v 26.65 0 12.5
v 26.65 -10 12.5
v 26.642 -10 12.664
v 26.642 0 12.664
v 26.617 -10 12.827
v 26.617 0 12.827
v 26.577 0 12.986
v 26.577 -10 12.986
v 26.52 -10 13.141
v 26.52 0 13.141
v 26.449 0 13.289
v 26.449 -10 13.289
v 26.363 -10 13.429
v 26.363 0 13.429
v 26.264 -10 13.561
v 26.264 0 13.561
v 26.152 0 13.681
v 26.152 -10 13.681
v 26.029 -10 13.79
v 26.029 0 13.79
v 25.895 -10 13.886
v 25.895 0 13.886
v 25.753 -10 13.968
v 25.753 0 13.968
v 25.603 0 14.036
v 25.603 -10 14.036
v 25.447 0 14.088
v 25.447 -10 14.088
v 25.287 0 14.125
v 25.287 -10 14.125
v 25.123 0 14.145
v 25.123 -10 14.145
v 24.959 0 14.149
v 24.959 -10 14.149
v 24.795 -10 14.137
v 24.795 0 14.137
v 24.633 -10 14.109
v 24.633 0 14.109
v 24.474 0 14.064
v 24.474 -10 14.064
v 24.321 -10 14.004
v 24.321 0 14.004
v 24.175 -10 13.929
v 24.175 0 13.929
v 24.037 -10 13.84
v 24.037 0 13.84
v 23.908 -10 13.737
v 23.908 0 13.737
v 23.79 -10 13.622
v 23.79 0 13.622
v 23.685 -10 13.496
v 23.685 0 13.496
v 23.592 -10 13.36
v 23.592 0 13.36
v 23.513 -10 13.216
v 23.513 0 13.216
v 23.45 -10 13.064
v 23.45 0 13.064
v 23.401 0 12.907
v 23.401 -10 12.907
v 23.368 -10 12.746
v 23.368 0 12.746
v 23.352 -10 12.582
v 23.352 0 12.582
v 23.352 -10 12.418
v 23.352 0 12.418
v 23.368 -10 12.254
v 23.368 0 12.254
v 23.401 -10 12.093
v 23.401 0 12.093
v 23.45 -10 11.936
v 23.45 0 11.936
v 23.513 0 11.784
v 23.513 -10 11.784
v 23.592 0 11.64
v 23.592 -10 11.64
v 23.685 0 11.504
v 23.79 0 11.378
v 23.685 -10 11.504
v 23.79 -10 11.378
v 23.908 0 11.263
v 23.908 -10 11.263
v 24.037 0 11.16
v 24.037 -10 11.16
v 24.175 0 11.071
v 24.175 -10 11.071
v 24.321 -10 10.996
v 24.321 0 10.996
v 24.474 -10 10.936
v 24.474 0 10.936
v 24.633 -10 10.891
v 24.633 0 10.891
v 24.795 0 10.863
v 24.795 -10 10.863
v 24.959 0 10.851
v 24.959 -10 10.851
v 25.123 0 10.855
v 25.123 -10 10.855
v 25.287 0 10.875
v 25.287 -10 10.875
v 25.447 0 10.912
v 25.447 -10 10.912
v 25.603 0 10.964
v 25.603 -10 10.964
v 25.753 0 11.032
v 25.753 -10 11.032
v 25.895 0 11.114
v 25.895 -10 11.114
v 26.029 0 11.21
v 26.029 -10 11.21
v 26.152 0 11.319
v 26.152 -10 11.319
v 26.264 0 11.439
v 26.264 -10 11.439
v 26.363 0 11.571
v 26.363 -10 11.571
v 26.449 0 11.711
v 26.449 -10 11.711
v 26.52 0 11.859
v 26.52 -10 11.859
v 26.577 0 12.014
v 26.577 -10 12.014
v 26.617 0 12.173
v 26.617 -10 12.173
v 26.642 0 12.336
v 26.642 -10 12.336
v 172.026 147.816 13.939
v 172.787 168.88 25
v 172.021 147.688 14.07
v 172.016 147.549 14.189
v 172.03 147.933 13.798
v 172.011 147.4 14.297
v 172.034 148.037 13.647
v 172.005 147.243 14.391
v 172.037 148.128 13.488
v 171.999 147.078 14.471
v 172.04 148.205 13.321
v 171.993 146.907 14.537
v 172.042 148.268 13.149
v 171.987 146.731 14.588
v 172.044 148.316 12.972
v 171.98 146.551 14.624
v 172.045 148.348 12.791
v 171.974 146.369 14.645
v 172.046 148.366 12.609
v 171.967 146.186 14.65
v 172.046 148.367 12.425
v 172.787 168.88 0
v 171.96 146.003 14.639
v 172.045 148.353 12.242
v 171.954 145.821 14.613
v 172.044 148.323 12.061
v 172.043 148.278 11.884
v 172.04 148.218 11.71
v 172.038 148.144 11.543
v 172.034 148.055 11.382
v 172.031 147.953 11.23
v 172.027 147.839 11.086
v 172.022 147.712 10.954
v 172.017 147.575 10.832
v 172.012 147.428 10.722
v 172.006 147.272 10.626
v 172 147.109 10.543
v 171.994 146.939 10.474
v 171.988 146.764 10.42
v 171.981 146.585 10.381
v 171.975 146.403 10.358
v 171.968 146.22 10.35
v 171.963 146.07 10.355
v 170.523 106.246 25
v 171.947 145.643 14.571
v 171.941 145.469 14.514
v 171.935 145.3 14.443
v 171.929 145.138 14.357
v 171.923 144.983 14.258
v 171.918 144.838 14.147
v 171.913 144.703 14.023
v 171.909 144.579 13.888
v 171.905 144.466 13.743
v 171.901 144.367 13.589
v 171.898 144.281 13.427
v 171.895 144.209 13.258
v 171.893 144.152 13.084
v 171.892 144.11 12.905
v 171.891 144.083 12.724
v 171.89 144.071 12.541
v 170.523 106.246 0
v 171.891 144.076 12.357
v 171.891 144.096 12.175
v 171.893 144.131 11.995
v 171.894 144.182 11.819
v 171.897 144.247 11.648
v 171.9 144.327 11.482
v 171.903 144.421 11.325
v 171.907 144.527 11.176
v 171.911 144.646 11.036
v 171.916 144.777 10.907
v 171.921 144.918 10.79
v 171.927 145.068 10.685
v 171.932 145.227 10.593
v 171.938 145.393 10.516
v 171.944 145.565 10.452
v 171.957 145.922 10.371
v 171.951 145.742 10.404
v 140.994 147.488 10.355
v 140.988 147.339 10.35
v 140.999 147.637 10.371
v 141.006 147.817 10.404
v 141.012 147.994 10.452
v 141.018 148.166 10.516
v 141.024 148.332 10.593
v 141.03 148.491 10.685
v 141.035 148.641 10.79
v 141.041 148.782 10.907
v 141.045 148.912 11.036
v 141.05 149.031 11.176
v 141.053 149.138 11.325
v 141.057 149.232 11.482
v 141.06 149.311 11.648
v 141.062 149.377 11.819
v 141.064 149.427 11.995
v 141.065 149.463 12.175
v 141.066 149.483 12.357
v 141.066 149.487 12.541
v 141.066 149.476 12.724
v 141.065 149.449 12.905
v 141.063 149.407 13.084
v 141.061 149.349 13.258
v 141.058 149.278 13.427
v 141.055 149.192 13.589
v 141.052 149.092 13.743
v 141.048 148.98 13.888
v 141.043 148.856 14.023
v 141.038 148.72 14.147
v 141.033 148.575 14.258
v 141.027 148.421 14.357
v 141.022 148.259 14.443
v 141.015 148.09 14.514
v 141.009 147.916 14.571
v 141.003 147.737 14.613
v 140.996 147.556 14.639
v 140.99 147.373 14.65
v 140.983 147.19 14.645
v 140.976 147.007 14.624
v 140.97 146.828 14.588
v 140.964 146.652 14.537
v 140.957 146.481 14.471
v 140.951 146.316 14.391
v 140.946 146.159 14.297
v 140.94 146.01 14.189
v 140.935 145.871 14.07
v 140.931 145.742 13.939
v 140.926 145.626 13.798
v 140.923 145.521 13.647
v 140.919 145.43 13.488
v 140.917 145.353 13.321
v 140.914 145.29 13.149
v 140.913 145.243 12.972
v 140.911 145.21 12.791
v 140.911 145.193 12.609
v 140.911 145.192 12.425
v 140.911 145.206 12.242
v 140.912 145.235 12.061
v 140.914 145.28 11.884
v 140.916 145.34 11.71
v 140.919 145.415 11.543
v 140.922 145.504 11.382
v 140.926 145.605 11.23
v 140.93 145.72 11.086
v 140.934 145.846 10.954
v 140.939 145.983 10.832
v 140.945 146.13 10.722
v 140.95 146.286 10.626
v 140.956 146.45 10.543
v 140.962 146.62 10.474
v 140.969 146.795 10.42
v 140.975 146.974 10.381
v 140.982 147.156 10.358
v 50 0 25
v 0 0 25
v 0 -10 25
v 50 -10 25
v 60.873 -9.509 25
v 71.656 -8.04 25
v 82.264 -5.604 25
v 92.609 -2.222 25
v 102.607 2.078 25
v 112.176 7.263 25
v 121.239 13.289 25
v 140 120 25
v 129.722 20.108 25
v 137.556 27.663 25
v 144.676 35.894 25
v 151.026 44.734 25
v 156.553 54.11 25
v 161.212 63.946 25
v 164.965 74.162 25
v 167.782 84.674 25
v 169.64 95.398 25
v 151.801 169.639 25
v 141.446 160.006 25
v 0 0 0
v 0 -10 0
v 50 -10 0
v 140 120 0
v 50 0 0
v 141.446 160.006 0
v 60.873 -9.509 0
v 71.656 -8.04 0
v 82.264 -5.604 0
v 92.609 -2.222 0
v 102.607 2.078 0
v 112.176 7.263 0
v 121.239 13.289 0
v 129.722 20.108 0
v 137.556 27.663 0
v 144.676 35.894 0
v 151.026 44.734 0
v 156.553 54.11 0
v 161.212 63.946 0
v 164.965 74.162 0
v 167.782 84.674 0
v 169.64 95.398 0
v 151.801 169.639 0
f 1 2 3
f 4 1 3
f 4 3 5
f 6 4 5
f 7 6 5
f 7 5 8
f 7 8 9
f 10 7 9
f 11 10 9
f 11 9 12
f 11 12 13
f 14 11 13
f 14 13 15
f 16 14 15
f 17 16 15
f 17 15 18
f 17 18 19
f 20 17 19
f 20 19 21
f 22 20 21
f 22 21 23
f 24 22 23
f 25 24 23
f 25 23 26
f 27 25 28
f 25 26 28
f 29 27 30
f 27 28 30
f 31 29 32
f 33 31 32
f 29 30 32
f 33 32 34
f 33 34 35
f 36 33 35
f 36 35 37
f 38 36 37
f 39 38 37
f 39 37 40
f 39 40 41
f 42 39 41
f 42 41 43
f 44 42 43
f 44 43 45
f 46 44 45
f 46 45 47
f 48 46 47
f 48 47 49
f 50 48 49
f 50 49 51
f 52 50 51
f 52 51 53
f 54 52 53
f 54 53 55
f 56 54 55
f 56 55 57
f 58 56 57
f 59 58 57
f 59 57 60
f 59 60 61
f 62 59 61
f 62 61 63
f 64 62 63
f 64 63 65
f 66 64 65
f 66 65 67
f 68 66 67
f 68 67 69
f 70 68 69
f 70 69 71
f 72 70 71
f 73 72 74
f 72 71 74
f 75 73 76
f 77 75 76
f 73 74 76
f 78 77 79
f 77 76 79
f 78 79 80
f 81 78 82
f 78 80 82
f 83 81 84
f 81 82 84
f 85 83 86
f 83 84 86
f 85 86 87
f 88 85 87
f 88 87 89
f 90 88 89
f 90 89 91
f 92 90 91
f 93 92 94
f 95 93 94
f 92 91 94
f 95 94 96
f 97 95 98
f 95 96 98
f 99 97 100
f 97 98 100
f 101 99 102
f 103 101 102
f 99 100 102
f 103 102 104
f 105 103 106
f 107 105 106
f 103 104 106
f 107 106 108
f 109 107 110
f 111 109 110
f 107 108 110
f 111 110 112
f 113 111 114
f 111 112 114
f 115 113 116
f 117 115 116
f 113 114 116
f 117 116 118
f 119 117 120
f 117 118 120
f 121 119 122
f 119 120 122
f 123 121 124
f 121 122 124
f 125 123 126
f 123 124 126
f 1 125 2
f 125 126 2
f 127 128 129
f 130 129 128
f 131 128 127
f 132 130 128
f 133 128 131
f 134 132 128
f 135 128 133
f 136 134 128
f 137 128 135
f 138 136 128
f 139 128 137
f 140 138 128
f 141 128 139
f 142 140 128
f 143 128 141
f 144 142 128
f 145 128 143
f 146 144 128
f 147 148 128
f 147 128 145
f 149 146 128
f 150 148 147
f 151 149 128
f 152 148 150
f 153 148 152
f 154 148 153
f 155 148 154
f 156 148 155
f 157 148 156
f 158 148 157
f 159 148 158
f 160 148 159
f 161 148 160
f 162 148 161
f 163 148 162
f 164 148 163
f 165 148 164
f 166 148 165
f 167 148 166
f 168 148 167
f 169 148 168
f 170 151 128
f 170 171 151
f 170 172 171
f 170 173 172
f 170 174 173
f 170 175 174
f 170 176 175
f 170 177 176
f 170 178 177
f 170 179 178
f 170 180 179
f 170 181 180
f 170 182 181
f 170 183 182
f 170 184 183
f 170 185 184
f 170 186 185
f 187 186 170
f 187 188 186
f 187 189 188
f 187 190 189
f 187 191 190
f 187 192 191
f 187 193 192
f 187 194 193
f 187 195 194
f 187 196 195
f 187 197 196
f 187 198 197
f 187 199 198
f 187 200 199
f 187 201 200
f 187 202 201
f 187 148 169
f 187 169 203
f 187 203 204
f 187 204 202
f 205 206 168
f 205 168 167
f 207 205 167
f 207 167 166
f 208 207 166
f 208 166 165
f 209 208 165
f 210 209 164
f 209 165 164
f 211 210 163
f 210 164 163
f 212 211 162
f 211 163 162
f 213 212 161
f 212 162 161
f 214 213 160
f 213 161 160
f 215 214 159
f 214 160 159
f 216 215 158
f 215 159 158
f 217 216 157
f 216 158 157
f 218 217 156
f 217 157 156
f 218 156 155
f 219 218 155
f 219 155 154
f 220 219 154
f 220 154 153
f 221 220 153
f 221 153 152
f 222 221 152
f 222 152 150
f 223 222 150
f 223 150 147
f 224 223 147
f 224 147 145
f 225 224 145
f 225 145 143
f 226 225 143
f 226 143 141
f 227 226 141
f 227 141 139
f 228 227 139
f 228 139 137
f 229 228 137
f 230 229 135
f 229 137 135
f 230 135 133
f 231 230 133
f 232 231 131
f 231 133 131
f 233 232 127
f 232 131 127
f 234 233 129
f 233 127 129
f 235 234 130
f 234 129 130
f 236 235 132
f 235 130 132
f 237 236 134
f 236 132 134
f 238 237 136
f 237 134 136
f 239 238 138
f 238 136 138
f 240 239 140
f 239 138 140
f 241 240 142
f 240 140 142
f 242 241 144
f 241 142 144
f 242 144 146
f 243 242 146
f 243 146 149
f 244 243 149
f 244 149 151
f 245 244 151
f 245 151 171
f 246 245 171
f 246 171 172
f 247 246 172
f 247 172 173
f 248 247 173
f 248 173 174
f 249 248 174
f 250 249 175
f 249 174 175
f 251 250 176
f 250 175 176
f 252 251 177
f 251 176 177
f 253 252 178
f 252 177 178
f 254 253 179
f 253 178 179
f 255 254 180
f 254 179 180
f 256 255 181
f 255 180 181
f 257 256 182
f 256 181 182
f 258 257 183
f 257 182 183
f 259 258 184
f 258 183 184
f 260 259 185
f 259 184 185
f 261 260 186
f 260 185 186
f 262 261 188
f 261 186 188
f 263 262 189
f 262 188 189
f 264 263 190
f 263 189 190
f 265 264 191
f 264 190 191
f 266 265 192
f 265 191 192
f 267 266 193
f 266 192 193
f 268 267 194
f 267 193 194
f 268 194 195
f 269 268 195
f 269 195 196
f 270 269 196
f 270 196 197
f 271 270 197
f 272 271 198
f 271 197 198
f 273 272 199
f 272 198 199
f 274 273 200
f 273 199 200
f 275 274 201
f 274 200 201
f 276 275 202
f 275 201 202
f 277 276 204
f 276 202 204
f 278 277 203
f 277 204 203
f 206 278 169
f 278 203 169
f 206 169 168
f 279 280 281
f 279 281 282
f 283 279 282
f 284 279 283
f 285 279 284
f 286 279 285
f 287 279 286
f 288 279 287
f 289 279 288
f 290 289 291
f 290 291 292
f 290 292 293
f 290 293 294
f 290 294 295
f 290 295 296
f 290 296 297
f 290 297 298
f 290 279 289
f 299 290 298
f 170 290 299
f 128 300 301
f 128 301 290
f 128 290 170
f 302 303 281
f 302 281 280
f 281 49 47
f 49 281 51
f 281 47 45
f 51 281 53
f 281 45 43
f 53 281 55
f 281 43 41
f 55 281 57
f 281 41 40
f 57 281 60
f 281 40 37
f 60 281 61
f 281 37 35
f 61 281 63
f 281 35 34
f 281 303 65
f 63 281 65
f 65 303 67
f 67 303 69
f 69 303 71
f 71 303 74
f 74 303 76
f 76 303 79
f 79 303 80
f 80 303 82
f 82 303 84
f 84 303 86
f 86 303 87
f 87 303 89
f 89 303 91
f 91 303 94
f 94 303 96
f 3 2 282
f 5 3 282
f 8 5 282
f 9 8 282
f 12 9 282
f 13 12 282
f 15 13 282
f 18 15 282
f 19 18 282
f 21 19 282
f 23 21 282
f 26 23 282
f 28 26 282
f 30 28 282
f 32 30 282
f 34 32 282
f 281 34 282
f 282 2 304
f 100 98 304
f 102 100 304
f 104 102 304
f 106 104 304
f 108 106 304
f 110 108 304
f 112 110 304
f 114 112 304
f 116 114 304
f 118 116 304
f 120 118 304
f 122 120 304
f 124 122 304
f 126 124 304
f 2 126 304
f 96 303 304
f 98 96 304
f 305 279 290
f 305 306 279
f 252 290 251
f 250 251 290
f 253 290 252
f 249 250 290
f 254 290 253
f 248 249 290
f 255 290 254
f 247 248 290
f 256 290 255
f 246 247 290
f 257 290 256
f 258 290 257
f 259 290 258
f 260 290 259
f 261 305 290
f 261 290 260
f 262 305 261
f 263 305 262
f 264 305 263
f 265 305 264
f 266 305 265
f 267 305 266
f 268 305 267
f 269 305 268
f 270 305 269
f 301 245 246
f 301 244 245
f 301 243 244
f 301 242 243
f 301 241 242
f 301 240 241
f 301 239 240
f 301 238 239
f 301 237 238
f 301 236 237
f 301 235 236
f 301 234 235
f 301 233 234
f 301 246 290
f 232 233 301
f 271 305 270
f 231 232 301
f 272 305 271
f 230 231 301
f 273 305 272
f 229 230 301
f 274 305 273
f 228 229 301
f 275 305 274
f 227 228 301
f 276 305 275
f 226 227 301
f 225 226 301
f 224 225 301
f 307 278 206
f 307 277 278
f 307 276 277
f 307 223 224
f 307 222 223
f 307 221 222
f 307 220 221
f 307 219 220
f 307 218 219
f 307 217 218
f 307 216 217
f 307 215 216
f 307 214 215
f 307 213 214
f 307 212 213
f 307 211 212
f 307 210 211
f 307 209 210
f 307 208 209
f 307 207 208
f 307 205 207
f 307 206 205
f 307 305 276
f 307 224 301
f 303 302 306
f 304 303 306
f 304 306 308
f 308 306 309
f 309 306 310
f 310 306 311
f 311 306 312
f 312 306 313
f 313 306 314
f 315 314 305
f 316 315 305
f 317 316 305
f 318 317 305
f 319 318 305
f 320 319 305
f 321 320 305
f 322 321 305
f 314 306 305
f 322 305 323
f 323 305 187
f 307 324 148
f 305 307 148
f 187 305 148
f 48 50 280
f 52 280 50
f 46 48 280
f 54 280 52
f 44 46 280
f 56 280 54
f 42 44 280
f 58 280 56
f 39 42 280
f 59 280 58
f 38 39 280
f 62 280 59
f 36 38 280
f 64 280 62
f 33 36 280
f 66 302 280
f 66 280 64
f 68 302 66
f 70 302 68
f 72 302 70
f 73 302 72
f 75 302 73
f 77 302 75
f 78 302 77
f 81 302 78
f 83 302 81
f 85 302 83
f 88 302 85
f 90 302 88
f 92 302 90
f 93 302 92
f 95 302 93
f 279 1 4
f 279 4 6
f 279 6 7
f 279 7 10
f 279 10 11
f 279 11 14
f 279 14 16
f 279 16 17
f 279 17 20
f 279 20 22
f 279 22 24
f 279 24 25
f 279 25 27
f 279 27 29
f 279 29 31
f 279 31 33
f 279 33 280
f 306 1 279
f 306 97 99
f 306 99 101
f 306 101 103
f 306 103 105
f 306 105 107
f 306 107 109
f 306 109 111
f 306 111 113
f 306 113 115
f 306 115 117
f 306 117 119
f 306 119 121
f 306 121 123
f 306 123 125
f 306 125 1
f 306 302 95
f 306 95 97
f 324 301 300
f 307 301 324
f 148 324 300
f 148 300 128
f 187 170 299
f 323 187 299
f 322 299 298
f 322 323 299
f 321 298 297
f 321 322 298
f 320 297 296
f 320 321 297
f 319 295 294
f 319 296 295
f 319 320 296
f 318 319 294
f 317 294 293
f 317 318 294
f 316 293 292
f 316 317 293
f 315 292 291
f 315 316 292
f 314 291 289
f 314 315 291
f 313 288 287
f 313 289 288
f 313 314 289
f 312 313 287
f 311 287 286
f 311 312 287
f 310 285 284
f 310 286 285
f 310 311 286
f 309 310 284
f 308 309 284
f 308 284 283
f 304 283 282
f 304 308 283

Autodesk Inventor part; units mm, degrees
ref_plane "YZ Plane" through (0, 0, 0) normal (1, 0, 0) x (0, 1, 0)
ref_plane "XZ Plane" through (0, 0, 0) normal (0, 1, 0) x (-1, 0, 0)
ref_plane "XY Plane" through (0, 0, 0) normal (0, 0, 1) x (1, 0, 0)
sketch "Sketch1" plane through (0, 0, 0) normal (0, 0, 1) x (1, 0, 0)
  line L0 (0, 0) -> (50, 0)
  line L1 (50, 0) -> (140.0002, 119.9998)
  line L2 (140.0002, 119.9998) -> (141.8074, 169.9998)
  line L3 (172.7872, 168.8801) -> (170.5233, 106.2458)
  line L4 (0, -10) -> (50, -10)
  arc A0 (50, -10) -> (170.5233, 106.2458) centre (50, 110.602) ccw
  line L5 (0, -10) -> (0, 0)
  line L6 (141.8074, 169.9998) -> (172.7872, 168.8801)
  line L7 (140.0002, 119.9998) -> (171.0205, 119.9998)
  dimension "d0" = 150
  dimension "d1" = 126.87
  dimension "d2" = 50
  dimension "d3" = 145.2
  dimension "d4" = 31
  dimension "d5" = 10
  dimension "d6" = 50
extrude "Extrusion1" add sketch "Sketch1" along normal blind 25
sketch "Sketch2" plane through (0, -10, 0) normal (0, -1, 0) x (1, 0, 0)
  line L0 (0, 0) -> (50, 0) projected
  line L1 (50, 0) -> (50, 25) projected
  line L2 (0, 25) -> (50, 25) projected
  line L3 (0, 0) -> (0, 25) projected
  circle A0 centre (25, 12.5) radius 1.65
  point P0 (50, 12.5)
  point P1 (25, 25)
  dimension "d9" = 3.3
extrude "Extrusion2" cut sketch "Sketch2" against normal through all contours A0
sketch "Sketch3" plane through (172.7872, 168.8801, 25) normal (0.9993, -0.0361, 0) x (0, 0, -1)
  line L0 (25, -62.6752) -> (25, 0) projected
  line L1 (25, 0) -> (0, 0) projected
  line L2 (0, -62.6752) -> (0, 0) projected
  line L3 (25, -62.6752) -> (0, -62.6752) projected
  circle A0 centre (12.5, -22.6752) radius 2.15
  point P0 (25, -175.0111)
  point P1 (12.5, -62.6752)
  dimension "d12" = 4.3
  dimension "d13" = 40
extrude "Extrusion3" cut sketch "Sketch3" against normal through all contours A0
chamfer "Chamfer1" distance 10 angle 45 1 edges at (141.8074, 169.9998, 12.5)
properties part number "ESQUINA_REDONDEADA_TRASERA" material "Steel, Mild, Welded"
